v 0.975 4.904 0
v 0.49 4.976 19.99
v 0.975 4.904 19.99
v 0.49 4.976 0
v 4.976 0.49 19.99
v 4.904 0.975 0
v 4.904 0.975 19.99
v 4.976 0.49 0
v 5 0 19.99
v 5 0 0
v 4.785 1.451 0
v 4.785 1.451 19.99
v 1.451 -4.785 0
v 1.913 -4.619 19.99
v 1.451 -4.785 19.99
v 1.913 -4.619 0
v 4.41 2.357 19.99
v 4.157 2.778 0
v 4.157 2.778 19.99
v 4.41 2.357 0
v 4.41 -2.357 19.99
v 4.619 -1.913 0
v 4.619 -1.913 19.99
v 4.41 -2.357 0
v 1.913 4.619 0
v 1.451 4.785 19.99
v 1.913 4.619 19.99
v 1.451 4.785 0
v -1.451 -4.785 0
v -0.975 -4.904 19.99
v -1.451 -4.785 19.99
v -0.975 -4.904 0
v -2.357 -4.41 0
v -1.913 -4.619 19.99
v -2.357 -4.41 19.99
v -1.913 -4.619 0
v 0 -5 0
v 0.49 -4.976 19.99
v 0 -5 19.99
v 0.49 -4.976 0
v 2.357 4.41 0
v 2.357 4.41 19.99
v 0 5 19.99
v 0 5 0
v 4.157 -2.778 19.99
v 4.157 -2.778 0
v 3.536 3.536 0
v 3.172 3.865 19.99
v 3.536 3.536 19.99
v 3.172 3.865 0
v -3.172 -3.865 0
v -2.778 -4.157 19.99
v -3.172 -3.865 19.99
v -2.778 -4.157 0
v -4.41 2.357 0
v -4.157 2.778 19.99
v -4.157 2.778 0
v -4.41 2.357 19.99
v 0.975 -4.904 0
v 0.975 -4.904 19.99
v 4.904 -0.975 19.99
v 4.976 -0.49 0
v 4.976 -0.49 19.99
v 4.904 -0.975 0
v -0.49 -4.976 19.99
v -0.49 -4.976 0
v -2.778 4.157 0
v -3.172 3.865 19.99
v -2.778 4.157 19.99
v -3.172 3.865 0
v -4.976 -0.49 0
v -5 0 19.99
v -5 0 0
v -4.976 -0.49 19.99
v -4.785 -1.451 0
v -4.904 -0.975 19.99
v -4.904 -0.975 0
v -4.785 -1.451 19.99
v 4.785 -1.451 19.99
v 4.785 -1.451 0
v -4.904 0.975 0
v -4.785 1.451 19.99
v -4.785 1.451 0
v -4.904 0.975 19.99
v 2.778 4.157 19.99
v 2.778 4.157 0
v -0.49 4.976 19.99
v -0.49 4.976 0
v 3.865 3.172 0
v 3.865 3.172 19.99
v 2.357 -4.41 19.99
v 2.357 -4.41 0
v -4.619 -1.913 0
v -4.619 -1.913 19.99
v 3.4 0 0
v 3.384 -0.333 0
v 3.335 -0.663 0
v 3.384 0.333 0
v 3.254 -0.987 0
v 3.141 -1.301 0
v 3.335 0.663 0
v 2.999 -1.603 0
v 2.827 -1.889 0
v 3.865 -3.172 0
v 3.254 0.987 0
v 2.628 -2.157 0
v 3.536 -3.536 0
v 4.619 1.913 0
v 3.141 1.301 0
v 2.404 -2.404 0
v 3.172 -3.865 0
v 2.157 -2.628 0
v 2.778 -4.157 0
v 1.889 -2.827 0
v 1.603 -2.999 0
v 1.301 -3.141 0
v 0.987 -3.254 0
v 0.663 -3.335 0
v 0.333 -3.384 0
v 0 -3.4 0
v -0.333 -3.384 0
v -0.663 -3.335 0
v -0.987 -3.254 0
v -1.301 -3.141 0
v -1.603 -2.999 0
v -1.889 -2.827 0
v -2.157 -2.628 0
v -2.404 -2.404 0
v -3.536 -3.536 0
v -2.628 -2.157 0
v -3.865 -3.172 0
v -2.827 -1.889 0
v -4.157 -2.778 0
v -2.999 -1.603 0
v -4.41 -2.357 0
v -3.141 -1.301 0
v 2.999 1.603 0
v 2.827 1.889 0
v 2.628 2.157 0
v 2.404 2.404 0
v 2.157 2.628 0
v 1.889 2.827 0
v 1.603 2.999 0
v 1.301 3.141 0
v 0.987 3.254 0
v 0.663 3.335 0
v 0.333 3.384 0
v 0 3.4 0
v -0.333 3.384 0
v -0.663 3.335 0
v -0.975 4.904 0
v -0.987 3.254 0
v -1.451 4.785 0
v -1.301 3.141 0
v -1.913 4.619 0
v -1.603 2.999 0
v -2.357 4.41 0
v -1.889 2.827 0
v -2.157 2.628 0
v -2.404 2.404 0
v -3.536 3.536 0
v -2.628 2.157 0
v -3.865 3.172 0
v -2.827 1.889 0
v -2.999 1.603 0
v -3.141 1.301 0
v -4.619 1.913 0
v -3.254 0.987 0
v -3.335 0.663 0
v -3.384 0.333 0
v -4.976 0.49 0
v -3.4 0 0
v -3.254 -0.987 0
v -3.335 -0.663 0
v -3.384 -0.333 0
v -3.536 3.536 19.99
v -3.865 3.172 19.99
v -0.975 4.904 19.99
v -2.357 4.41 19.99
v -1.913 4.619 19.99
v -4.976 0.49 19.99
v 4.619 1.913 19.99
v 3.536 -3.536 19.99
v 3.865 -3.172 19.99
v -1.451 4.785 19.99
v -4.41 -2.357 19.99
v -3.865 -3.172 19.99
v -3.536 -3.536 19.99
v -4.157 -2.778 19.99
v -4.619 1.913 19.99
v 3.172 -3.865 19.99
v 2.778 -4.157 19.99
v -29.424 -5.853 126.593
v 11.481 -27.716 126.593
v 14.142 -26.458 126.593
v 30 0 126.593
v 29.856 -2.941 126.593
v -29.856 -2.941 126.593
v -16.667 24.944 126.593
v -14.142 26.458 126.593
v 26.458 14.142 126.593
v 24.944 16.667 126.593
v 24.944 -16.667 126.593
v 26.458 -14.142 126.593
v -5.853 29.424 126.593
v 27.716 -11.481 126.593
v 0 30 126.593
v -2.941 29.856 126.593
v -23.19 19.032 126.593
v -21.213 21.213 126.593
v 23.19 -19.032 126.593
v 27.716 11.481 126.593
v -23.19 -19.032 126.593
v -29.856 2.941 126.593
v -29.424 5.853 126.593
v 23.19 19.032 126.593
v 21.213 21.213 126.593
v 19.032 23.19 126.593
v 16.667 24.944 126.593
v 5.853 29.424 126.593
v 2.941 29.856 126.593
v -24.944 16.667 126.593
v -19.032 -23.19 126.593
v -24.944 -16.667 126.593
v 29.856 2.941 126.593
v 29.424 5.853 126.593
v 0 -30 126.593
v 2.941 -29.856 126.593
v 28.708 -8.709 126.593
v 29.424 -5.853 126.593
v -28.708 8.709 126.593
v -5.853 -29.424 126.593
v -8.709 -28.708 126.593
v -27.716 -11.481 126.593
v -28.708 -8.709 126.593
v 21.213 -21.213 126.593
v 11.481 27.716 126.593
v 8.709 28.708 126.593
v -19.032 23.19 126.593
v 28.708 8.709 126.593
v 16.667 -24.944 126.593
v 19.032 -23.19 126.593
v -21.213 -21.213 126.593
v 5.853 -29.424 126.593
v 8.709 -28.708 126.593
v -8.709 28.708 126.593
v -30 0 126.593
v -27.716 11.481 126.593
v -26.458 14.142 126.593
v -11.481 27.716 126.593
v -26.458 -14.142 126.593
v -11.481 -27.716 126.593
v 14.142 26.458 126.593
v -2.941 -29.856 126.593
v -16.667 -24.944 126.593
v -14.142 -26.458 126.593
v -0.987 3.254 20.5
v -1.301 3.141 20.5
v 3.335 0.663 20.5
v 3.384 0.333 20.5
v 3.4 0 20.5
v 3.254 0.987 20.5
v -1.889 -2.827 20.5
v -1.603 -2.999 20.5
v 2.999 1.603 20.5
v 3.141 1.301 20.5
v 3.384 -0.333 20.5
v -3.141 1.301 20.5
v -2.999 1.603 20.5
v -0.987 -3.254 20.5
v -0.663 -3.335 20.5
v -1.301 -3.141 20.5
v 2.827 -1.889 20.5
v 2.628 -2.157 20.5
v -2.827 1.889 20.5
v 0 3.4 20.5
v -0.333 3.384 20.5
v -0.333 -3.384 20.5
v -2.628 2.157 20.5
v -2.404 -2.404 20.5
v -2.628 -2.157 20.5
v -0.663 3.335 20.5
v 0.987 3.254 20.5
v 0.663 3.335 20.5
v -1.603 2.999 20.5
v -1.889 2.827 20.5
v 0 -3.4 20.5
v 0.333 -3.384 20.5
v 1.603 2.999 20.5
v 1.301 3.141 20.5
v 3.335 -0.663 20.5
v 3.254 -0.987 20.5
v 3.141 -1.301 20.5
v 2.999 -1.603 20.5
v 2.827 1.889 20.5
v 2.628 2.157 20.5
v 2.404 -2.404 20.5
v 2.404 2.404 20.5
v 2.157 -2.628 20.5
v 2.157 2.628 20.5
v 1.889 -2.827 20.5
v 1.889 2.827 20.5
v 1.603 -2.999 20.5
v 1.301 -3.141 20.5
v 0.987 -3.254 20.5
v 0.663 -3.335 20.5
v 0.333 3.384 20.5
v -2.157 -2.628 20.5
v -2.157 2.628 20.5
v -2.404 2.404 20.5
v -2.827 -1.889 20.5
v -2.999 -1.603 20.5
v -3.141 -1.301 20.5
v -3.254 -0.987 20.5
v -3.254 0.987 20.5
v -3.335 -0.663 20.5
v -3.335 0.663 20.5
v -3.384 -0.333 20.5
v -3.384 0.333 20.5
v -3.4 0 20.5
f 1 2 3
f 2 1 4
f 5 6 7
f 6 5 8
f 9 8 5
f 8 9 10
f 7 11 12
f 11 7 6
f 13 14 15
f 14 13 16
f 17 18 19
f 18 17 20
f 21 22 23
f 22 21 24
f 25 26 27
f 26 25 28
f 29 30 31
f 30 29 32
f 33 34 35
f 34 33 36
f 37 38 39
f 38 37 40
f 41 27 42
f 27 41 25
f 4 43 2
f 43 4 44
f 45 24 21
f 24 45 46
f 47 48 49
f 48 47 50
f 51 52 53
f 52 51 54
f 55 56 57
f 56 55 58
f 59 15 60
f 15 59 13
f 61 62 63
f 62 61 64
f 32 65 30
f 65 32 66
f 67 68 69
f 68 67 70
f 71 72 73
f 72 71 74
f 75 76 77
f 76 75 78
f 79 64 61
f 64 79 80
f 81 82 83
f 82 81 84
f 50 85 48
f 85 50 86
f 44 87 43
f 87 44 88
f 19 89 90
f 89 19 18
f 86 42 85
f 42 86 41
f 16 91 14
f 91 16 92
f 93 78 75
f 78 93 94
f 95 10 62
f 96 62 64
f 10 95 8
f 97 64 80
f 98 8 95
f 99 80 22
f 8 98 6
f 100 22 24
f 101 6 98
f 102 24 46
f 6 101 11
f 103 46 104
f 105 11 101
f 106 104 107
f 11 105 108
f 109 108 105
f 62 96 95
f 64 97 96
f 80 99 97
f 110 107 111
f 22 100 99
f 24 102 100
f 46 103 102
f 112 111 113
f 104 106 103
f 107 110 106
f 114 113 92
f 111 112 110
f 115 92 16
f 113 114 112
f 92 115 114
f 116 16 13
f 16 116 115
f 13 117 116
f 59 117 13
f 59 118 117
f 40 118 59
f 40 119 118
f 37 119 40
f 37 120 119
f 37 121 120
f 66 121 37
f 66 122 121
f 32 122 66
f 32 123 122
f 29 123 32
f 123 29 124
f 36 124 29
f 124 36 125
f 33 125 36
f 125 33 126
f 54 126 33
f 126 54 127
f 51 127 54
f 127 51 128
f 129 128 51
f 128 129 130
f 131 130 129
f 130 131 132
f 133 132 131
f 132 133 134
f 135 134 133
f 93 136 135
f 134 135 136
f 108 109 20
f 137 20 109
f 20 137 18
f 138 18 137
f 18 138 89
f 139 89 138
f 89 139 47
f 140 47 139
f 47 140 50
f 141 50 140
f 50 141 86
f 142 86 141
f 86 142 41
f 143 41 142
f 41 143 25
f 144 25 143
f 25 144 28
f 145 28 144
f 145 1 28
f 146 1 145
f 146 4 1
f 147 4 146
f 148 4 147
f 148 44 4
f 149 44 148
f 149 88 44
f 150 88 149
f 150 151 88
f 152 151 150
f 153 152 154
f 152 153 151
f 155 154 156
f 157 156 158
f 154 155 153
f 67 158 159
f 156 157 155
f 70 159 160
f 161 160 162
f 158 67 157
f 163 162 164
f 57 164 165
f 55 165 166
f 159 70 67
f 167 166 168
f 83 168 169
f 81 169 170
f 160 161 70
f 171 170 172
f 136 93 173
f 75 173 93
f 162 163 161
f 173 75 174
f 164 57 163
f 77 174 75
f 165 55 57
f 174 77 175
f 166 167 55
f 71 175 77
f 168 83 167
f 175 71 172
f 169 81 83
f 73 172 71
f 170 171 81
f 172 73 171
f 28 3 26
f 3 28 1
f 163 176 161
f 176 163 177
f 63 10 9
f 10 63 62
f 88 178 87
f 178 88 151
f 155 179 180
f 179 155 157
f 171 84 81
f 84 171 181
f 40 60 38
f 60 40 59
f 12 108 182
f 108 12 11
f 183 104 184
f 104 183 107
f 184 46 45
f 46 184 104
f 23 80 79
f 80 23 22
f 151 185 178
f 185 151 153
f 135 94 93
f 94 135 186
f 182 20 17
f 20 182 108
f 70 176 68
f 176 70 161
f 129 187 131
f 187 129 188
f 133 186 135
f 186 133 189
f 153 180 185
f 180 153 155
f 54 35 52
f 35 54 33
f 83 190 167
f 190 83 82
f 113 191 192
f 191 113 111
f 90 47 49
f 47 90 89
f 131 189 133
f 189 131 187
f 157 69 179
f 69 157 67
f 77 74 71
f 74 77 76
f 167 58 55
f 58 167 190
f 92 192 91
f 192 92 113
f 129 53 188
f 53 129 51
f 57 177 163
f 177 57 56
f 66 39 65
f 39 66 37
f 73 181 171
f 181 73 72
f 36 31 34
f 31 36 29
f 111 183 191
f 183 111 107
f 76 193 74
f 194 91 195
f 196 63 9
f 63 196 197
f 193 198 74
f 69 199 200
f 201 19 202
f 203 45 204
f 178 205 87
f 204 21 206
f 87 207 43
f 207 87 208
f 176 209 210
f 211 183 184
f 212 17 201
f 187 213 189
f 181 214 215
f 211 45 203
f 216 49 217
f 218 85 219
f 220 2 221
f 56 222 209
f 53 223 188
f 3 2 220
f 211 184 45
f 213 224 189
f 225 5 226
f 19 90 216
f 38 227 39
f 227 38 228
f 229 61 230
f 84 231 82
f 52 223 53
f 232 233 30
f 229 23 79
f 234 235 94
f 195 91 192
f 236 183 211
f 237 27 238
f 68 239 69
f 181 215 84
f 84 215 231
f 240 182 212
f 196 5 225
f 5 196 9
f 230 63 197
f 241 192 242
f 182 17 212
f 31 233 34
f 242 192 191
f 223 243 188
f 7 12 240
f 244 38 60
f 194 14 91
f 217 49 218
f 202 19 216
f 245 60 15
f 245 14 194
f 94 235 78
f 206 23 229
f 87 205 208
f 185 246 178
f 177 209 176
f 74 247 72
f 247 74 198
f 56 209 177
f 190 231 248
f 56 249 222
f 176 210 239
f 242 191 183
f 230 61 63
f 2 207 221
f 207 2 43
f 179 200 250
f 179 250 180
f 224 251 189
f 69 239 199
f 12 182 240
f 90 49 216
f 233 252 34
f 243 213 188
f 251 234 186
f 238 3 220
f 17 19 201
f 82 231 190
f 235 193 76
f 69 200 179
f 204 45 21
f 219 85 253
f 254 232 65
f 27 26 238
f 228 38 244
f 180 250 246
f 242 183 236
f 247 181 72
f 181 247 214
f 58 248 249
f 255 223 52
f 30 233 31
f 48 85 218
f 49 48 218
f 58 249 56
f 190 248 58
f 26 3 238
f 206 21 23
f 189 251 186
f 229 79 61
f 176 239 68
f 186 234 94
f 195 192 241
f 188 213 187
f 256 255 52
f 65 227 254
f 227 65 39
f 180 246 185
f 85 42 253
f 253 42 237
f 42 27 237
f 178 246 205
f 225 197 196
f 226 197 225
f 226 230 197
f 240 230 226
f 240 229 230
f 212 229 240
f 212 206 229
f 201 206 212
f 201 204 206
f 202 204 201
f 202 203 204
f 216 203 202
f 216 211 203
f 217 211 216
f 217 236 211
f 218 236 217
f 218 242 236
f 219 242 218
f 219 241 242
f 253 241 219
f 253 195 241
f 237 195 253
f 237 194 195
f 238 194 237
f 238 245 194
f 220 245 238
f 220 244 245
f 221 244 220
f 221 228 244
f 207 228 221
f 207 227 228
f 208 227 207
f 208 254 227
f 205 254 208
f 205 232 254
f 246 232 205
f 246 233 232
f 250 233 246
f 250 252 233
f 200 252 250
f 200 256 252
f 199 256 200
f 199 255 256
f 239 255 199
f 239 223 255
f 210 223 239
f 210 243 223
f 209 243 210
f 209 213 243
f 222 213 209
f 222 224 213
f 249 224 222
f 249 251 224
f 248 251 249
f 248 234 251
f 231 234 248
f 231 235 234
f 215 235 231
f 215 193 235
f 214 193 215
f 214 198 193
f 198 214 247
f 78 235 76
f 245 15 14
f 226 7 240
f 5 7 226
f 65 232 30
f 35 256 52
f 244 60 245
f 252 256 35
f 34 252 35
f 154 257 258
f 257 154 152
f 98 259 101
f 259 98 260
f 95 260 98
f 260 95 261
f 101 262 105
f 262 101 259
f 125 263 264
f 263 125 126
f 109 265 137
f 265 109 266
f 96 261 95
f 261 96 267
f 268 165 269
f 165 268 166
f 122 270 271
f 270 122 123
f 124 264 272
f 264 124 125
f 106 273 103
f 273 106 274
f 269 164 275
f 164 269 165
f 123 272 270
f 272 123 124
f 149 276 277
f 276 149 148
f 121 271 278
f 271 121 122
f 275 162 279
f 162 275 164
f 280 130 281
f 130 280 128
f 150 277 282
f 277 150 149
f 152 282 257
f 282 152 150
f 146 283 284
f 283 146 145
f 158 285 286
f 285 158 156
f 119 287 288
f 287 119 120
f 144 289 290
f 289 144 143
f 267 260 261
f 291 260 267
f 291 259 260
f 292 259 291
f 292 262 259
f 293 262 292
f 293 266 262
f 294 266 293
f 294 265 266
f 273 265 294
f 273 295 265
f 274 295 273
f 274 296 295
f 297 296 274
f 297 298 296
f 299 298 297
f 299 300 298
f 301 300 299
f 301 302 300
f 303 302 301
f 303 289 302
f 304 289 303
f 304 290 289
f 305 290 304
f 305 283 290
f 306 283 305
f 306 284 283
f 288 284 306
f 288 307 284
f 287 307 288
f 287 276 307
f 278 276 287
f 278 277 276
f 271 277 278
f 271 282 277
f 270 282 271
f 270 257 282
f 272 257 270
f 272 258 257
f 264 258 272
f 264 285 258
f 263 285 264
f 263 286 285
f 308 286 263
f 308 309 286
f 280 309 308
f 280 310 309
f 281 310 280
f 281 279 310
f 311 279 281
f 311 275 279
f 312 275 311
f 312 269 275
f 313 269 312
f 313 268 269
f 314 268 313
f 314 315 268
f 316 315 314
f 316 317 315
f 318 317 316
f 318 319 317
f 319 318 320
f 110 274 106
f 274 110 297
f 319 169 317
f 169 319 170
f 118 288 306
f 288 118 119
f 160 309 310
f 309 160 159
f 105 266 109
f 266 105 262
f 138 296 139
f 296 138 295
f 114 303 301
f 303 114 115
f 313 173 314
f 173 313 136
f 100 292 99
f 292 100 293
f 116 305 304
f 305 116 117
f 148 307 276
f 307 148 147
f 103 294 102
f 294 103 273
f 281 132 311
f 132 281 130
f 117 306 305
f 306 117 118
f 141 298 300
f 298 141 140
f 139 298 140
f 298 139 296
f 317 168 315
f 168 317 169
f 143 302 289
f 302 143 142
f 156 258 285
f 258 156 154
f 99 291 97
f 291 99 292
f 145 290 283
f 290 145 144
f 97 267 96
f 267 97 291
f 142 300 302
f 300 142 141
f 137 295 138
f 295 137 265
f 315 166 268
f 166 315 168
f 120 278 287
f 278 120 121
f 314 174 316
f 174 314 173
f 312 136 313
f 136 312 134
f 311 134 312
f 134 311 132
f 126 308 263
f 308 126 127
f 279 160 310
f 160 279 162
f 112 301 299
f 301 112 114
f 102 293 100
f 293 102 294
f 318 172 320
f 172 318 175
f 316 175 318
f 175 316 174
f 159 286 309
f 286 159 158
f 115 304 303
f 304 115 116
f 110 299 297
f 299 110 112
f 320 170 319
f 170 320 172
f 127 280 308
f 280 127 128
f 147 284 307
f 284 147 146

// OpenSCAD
// Lab funnel - printed upright, wide opening at the top
// Units: mm. Wall thickness 1.6 mm throughout.

$fn = 64;

// ---- Dimensions ----
spout_od      = 10;    // outer diameter of straight spout
spout_id      = spout_od - 2 * 1.6;  // spout bore (6.8 mm)
spout_h       = 20;    // spout length, z = 0 .. 20

cone_bottom_d = spout_od;               // cone starts at spout diameter
cone_top_d    = 60;                     // cone rim diameter
cone_h        = spout_h + (cone_top_d - cone_bottom_d) / tan(30); // 50 mm rim height

eps = 0.5;             // cutter overshoot past faces

// ---- Model ----
difference() {
    union() {
        // Straight spout
        cylinder(h = spout_h, d = spout_od);

        // Cone, overlapping slightly into the spout for a clean union
        translate([0, 0, spout_h - 0.01])
            cylinder(h = cone_h, d1 = cone_bottom_d, d2 = cone_top_d);
    }

    // Bottom exit hole through the spout
    translate([0, 0, -eps])
        cylinder(h = spout_h + 2 * eps, d = spout_id);
}
